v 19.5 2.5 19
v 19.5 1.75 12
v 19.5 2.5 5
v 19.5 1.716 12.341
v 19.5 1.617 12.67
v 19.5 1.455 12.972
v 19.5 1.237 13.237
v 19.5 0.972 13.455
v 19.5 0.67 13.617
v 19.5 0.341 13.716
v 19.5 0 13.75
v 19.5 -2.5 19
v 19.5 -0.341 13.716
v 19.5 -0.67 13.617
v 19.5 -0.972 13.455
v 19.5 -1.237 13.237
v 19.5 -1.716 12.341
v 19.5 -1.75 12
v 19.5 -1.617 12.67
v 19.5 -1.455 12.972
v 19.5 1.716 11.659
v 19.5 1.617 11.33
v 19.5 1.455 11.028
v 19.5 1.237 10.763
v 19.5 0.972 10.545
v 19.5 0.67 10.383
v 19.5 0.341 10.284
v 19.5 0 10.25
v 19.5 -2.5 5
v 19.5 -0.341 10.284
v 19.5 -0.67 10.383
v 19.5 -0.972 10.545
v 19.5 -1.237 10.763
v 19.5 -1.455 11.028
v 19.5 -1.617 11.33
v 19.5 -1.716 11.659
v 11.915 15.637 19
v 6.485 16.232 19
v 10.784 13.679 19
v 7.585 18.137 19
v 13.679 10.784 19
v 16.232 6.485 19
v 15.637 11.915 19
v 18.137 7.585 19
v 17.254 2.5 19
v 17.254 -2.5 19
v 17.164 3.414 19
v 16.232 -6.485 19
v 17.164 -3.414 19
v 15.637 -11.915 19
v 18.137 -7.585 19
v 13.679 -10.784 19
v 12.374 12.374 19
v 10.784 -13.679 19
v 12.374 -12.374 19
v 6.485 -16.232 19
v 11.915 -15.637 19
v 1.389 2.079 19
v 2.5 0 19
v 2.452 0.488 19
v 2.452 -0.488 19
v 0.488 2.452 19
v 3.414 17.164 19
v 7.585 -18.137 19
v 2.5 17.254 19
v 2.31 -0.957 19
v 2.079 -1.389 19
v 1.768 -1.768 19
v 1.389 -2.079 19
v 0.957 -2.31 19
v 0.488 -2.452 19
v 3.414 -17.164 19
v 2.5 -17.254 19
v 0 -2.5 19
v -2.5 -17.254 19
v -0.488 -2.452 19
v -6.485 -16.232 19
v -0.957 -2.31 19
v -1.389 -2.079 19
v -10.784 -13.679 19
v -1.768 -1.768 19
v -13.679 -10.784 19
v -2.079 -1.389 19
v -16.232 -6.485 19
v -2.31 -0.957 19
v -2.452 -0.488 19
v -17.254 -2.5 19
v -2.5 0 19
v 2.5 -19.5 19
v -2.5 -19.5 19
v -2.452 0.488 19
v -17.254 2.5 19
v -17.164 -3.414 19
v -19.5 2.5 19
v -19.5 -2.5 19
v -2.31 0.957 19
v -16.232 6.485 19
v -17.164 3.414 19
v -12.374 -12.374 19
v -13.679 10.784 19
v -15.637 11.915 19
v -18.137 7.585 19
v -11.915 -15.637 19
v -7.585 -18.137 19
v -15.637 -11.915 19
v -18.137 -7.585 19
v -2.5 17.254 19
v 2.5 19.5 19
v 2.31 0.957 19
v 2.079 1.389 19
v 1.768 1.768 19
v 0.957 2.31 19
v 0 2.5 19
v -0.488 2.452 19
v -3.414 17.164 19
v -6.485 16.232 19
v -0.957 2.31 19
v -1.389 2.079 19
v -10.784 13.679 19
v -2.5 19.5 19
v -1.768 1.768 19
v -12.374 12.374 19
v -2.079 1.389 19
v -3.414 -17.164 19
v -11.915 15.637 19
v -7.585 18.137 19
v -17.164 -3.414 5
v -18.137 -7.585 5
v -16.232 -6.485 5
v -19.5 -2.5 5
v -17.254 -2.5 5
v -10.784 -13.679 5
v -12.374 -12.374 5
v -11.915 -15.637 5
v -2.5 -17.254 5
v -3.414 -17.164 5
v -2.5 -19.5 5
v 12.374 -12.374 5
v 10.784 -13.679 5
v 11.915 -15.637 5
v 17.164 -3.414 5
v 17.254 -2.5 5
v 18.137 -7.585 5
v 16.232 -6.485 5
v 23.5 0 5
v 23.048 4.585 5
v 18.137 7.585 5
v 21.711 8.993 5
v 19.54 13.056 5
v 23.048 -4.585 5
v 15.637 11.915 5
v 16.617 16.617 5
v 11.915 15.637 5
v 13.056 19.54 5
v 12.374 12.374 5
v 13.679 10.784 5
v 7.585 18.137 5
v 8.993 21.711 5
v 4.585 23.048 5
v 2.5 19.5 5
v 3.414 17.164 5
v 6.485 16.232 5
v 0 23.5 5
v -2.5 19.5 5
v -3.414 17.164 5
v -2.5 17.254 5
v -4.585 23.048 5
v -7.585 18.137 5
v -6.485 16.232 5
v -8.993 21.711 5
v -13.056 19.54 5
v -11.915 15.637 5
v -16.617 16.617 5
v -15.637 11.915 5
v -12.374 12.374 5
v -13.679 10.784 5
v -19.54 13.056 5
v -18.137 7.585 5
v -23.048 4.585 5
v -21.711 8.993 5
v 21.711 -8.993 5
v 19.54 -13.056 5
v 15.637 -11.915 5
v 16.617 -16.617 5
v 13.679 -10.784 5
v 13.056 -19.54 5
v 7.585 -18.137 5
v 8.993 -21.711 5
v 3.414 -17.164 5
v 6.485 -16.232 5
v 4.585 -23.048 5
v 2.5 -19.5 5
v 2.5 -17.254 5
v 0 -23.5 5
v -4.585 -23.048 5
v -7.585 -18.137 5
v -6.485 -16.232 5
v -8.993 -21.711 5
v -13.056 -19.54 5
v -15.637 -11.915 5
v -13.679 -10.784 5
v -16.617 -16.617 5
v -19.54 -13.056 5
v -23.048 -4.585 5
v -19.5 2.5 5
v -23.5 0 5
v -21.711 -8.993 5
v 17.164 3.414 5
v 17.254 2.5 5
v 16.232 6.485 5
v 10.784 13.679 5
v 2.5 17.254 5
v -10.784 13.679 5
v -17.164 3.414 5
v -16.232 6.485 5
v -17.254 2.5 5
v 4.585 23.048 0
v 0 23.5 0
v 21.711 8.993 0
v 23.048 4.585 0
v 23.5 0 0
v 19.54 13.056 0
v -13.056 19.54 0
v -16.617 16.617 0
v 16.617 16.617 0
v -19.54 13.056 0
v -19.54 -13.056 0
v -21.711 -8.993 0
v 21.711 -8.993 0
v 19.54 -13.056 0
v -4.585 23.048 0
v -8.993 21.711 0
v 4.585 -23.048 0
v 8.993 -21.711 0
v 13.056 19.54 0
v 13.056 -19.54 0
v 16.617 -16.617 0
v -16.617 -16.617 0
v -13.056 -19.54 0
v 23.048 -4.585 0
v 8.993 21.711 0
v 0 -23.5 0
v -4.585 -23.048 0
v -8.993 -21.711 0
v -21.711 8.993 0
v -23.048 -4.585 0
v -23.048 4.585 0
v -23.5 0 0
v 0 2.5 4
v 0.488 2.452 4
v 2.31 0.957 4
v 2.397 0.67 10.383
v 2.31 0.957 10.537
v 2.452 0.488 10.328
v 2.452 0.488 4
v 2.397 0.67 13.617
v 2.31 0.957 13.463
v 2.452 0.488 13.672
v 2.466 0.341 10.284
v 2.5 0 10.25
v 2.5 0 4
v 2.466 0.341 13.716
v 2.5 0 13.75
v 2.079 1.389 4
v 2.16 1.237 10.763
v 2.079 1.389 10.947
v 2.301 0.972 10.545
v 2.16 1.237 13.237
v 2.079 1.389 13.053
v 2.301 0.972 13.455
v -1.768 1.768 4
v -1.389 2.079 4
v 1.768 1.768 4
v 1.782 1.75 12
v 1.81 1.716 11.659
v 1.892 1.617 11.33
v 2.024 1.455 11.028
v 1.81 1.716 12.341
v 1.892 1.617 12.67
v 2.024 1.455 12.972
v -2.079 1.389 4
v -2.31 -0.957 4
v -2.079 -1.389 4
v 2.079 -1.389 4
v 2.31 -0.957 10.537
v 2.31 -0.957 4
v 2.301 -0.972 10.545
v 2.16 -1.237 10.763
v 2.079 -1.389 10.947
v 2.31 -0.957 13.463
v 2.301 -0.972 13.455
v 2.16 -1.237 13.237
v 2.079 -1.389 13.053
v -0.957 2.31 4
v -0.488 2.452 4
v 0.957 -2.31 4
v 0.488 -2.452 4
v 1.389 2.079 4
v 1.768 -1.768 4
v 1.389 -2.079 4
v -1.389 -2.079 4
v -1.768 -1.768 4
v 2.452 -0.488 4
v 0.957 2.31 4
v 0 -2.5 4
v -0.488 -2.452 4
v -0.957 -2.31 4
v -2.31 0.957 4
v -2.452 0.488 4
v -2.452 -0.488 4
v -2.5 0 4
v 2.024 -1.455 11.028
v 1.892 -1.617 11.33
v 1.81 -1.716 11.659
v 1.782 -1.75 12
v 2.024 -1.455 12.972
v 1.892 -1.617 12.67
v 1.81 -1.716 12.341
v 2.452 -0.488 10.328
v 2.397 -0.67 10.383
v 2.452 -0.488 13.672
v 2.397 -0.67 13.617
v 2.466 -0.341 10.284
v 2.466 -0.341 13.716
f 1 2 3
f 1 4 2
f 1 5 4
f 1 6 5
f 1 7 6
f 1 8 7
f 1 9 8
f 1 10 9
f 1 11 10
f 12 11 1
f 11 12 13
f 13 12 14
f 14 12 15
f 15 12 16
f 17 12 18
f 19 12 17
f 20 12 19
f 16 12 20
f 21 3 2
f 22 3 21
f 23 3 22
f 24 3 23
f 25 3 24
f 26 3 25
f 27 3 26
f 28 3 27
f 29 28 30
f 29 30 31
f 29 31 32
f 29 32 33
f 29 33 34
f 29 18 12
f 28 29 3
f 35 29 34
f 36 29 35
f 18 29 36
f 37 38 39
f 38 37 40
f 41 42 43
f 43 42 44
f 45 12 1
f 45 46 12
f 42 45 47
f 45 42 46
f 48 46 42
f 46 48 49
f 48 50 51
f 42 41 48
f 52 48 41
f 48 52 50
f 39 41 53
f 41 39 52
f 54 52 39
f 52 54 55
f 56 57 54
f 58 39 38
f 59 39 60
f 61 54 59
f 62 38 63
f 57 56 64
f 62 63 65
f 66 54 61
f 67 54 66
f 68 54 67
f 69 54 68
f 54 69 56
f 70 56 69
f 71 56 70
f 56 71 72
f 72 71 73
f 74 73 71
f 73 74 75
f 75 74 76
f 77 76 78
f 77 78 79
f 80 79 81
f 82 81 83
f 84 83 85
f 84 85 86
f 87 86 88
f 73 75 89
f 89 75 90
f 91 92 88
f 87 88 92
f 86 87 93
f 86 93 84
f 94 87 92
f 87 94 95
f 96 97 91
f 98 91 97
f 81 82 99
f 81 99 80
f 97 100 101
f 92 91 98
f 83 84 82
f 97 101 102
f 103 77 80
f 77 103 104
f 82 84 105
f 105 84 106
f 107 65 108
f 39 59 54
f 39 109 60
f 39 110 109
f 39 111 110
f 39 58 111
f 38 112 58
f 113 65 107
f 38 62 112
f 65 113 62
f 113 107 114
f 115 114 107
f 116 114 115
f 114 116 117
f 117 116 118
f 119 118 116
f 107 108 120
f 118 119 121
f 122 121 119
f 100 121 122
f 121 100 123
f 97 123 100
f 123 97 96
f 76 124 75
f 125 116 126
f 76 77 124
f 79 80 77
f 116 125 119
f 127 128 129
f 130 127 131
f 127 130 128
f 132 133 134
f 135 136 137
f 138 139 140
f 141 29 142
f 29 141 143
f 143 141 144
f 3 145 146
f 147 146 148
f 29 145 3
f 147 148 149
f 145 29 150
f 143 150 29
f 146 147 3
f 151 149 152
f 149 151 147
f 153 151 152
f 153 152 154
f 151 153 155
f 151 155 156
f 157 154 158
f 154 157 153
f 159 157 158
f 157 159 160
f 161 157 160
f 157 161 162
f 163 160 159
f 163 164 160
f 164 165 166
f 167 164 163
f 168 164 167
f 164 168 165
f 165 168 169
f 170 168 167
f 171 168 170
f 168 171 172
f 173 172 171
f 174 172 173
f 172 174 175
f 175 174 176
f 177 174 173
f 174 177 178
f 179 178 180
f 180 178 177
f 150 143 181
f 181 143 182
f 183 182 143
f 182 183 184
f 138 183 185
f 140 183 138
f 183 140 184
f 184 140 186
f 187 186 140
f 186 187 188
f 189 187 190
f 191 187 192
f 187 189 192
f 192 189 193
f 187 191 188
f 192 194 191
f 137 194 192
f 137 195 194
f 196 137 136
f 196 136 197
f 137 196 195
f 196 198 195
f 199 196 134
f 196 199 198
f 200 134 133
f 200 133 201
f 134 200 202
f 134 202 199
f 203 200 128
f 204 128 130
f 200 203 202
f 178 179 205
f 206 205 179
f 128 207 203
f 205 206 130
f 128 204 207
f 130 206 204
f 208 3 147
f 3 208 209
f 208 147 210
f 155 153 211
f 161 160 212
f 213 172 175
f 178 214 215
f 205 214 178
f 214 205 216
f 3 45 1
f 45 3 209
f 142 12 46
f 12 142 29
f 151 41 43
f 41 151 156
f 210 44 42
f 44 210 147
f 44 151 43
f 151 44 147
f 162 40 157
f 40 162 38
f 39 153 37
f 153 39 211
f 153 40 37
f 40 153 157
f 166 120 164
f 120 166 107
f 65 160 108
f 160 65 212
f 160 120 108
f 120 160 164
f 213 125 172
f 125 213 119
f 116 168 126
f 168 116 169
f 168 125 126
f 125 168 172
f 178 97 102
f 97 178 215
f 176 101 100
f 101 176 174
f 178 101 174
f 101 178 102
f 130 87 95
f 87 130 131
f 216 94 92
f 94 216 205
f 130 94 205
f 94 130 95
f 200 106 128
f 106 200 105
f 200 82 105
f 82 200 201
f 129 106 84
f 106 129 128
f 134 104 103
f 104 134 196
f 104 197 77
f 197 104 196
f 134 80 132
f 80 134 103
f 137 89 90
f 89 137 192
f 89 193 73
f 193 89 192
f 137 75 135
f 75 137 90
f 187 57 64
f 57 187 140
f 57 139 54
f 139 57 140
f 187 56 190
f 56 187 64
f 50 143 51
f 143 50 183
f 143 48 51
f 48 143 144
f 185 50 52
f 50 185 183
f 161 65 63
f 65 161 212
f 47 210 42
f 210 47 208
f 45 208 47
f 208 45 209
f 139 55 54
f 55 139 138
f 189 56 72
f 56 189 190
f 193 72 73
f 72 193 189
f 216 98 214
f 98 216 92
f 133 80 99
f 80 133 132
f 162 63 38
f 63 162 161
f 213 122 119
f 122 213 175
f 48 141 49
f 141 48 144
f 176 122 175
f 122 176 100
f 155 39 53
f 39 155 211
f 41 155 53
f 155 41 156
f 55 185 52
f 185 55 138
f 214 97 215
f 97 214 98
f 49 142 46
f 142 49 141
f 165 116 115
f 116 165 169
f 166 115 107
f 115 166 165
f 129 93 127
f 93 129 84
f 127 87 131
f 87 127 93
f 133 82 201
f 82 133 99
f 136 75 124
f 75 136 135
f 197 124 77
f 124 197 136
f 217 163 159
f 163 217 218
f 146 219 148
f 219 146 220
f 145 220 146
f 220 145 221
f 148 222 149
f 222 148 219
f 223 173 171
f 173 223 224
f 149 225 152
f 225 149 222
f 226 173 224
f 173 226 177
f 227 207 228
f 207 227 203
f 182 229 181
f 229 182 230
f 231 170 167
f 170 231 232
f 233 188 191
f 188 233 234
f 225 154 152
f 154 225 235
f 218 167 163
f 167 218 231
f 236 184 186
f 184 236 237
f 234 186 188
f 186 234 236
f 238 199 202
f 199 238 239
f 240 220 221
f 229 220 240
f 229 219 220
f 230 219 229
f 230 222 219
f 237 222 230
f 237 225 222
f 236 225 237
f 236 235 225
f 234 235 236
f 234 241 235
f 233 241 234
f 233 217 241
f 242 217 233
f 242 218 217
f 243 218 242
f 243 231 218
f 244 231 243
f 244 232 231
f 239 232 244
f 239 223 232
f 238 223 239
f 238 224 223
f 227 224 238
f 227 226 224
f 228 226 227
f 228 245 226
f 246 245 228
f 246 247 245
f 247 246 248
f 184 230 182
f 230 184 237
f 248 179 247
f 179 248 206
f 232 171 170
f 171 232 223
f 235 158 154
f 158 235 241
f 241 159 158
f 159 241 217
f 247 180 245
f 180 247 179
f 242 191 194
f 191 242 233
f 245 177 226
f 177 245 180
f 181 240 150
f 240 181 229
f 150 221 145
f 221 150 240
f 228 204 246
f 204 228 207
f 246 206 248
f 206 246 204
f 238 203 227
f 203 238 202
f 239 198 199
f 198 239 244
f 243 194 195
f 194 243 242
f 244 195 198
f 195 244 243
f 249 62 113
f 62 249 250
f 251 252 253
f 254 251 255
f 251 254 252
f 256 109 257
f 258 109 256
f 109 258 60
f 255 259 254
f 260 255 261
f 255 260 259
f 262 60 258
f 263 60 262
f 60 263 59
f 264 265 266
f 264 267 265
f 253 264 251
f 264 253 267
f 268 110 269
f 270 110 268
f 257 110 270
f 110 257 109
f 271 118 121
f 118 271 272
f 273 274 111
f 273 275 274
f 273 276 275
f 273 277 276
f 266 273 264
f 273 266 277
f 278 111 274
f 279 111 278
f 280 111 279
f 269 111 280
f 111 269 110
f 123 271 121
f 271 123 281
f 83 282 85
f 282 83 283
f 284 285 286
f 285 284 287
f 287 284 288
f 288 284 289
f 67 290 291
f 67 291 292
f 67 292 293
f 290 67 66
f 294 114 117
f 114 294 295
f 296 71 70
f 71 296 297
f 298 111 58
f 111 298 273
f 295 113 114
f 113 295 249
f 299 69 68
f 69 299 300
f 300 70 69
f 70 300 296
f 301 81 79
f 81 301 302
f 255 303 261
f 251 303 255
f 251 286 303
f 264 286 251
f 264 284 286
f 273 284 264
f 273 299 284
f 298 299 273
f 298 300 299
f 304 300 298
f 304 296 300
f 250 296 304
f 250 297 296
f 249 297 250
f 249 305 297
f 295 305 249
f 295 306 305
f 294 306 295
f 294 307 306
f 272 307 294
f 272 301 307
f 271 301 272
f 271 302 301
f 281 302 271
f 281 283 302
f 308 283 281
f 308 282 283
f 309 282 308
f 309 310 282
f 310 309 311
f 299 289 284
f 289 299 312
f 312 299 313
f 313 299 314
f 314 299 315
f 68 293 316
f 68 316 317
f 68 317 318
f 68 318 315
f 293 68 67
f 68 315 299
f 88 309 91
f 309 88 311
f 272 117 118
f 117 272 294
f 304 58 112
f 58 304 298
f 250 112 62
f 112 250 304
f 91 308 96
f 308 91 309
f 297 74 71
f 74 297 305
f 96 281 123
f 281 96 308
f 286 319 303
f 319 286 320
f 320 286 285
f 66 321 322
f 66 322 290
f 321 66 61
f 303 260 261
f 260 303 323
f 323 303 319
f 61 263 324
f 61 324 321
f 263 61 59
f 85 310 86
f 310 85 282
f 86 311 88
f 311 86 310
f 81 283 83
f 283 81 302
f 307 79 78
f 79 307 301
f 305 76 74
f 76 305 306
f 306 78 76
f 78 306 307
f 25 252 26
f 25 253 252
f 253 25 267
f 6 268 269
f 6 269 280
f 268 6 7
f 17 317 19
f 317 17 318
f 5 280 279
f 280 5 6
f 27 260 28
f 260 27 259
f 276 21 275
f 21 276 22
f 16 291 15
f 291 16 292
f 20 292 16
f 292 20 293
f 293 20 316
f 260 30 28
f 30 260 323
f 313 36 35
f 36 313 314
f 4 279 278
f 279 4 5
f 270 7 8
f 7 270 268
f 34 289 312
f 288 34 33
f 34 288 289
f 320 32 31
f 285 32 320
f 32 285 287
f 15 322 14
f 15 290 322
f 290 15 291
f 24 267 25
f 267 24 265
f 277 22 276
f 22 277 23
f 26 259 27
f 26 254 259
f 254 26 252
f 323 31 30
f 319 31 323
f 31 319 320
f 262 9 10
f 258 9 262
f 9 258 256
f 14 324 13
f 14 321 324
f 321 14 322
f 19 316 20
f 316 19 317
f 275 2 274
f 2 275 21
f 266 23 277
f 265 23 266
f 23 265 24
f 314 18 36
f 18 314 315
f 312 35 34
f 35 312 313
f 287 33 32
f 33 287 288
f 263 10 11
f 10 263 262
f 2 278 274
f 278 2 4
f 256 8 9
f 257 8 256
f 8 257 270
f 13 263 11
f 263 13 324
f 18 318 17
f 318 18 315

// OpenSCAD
$fn = 32;

// ----------------------------------------------------------------------
// Control knob: skirt knob with grip ribs
// ----------------------------------------------------------------------

// --- parameters (mm) ---
skirt_d = 47;             // skirt diameter
skirt_t = 5;              // skirt thickness
rib_w = 5;                // grip rib width
rib_out = 3;              // grip rib radial protrusion
n_ribs = 12;              // number of grip ribs
knob_d = 35;              // knob body diameter
knob_h = 14;              // knob body height
bore_d = 5;               // shaft bore diameter
set_d = 3.5;              // set screw bore diameter

rib_step = 360 / n_ribs;  // rib angular step
total_h = skirt_t + knob_h;  // overall height

difference() {
  union() {
    translate([0, 0, skirt_t]) cylinder(h = knob_h, d = knob_d);
    cylinder(h = skirt_t, d = skirt_d);
    for (i = [0 : n_ribs - 1])
      rotate([0, 0, i * rib_step])
        translate([knob_d / 2 - 1, -rib_w / 2, skirt_t])
          cube([rib_out, rib_w, knob_h]);
  }
  translate([0, 0, skirt_t - 1]) cylinder(h = knob_h + 2, d = bore_d);
  translate([-1, 0, skirt_t + knob_h / 2]) rotate([0, 90, 0])
    cylinder(h = knob_d / 2 + bore_d / 2 + 2, d = set_d);
}
